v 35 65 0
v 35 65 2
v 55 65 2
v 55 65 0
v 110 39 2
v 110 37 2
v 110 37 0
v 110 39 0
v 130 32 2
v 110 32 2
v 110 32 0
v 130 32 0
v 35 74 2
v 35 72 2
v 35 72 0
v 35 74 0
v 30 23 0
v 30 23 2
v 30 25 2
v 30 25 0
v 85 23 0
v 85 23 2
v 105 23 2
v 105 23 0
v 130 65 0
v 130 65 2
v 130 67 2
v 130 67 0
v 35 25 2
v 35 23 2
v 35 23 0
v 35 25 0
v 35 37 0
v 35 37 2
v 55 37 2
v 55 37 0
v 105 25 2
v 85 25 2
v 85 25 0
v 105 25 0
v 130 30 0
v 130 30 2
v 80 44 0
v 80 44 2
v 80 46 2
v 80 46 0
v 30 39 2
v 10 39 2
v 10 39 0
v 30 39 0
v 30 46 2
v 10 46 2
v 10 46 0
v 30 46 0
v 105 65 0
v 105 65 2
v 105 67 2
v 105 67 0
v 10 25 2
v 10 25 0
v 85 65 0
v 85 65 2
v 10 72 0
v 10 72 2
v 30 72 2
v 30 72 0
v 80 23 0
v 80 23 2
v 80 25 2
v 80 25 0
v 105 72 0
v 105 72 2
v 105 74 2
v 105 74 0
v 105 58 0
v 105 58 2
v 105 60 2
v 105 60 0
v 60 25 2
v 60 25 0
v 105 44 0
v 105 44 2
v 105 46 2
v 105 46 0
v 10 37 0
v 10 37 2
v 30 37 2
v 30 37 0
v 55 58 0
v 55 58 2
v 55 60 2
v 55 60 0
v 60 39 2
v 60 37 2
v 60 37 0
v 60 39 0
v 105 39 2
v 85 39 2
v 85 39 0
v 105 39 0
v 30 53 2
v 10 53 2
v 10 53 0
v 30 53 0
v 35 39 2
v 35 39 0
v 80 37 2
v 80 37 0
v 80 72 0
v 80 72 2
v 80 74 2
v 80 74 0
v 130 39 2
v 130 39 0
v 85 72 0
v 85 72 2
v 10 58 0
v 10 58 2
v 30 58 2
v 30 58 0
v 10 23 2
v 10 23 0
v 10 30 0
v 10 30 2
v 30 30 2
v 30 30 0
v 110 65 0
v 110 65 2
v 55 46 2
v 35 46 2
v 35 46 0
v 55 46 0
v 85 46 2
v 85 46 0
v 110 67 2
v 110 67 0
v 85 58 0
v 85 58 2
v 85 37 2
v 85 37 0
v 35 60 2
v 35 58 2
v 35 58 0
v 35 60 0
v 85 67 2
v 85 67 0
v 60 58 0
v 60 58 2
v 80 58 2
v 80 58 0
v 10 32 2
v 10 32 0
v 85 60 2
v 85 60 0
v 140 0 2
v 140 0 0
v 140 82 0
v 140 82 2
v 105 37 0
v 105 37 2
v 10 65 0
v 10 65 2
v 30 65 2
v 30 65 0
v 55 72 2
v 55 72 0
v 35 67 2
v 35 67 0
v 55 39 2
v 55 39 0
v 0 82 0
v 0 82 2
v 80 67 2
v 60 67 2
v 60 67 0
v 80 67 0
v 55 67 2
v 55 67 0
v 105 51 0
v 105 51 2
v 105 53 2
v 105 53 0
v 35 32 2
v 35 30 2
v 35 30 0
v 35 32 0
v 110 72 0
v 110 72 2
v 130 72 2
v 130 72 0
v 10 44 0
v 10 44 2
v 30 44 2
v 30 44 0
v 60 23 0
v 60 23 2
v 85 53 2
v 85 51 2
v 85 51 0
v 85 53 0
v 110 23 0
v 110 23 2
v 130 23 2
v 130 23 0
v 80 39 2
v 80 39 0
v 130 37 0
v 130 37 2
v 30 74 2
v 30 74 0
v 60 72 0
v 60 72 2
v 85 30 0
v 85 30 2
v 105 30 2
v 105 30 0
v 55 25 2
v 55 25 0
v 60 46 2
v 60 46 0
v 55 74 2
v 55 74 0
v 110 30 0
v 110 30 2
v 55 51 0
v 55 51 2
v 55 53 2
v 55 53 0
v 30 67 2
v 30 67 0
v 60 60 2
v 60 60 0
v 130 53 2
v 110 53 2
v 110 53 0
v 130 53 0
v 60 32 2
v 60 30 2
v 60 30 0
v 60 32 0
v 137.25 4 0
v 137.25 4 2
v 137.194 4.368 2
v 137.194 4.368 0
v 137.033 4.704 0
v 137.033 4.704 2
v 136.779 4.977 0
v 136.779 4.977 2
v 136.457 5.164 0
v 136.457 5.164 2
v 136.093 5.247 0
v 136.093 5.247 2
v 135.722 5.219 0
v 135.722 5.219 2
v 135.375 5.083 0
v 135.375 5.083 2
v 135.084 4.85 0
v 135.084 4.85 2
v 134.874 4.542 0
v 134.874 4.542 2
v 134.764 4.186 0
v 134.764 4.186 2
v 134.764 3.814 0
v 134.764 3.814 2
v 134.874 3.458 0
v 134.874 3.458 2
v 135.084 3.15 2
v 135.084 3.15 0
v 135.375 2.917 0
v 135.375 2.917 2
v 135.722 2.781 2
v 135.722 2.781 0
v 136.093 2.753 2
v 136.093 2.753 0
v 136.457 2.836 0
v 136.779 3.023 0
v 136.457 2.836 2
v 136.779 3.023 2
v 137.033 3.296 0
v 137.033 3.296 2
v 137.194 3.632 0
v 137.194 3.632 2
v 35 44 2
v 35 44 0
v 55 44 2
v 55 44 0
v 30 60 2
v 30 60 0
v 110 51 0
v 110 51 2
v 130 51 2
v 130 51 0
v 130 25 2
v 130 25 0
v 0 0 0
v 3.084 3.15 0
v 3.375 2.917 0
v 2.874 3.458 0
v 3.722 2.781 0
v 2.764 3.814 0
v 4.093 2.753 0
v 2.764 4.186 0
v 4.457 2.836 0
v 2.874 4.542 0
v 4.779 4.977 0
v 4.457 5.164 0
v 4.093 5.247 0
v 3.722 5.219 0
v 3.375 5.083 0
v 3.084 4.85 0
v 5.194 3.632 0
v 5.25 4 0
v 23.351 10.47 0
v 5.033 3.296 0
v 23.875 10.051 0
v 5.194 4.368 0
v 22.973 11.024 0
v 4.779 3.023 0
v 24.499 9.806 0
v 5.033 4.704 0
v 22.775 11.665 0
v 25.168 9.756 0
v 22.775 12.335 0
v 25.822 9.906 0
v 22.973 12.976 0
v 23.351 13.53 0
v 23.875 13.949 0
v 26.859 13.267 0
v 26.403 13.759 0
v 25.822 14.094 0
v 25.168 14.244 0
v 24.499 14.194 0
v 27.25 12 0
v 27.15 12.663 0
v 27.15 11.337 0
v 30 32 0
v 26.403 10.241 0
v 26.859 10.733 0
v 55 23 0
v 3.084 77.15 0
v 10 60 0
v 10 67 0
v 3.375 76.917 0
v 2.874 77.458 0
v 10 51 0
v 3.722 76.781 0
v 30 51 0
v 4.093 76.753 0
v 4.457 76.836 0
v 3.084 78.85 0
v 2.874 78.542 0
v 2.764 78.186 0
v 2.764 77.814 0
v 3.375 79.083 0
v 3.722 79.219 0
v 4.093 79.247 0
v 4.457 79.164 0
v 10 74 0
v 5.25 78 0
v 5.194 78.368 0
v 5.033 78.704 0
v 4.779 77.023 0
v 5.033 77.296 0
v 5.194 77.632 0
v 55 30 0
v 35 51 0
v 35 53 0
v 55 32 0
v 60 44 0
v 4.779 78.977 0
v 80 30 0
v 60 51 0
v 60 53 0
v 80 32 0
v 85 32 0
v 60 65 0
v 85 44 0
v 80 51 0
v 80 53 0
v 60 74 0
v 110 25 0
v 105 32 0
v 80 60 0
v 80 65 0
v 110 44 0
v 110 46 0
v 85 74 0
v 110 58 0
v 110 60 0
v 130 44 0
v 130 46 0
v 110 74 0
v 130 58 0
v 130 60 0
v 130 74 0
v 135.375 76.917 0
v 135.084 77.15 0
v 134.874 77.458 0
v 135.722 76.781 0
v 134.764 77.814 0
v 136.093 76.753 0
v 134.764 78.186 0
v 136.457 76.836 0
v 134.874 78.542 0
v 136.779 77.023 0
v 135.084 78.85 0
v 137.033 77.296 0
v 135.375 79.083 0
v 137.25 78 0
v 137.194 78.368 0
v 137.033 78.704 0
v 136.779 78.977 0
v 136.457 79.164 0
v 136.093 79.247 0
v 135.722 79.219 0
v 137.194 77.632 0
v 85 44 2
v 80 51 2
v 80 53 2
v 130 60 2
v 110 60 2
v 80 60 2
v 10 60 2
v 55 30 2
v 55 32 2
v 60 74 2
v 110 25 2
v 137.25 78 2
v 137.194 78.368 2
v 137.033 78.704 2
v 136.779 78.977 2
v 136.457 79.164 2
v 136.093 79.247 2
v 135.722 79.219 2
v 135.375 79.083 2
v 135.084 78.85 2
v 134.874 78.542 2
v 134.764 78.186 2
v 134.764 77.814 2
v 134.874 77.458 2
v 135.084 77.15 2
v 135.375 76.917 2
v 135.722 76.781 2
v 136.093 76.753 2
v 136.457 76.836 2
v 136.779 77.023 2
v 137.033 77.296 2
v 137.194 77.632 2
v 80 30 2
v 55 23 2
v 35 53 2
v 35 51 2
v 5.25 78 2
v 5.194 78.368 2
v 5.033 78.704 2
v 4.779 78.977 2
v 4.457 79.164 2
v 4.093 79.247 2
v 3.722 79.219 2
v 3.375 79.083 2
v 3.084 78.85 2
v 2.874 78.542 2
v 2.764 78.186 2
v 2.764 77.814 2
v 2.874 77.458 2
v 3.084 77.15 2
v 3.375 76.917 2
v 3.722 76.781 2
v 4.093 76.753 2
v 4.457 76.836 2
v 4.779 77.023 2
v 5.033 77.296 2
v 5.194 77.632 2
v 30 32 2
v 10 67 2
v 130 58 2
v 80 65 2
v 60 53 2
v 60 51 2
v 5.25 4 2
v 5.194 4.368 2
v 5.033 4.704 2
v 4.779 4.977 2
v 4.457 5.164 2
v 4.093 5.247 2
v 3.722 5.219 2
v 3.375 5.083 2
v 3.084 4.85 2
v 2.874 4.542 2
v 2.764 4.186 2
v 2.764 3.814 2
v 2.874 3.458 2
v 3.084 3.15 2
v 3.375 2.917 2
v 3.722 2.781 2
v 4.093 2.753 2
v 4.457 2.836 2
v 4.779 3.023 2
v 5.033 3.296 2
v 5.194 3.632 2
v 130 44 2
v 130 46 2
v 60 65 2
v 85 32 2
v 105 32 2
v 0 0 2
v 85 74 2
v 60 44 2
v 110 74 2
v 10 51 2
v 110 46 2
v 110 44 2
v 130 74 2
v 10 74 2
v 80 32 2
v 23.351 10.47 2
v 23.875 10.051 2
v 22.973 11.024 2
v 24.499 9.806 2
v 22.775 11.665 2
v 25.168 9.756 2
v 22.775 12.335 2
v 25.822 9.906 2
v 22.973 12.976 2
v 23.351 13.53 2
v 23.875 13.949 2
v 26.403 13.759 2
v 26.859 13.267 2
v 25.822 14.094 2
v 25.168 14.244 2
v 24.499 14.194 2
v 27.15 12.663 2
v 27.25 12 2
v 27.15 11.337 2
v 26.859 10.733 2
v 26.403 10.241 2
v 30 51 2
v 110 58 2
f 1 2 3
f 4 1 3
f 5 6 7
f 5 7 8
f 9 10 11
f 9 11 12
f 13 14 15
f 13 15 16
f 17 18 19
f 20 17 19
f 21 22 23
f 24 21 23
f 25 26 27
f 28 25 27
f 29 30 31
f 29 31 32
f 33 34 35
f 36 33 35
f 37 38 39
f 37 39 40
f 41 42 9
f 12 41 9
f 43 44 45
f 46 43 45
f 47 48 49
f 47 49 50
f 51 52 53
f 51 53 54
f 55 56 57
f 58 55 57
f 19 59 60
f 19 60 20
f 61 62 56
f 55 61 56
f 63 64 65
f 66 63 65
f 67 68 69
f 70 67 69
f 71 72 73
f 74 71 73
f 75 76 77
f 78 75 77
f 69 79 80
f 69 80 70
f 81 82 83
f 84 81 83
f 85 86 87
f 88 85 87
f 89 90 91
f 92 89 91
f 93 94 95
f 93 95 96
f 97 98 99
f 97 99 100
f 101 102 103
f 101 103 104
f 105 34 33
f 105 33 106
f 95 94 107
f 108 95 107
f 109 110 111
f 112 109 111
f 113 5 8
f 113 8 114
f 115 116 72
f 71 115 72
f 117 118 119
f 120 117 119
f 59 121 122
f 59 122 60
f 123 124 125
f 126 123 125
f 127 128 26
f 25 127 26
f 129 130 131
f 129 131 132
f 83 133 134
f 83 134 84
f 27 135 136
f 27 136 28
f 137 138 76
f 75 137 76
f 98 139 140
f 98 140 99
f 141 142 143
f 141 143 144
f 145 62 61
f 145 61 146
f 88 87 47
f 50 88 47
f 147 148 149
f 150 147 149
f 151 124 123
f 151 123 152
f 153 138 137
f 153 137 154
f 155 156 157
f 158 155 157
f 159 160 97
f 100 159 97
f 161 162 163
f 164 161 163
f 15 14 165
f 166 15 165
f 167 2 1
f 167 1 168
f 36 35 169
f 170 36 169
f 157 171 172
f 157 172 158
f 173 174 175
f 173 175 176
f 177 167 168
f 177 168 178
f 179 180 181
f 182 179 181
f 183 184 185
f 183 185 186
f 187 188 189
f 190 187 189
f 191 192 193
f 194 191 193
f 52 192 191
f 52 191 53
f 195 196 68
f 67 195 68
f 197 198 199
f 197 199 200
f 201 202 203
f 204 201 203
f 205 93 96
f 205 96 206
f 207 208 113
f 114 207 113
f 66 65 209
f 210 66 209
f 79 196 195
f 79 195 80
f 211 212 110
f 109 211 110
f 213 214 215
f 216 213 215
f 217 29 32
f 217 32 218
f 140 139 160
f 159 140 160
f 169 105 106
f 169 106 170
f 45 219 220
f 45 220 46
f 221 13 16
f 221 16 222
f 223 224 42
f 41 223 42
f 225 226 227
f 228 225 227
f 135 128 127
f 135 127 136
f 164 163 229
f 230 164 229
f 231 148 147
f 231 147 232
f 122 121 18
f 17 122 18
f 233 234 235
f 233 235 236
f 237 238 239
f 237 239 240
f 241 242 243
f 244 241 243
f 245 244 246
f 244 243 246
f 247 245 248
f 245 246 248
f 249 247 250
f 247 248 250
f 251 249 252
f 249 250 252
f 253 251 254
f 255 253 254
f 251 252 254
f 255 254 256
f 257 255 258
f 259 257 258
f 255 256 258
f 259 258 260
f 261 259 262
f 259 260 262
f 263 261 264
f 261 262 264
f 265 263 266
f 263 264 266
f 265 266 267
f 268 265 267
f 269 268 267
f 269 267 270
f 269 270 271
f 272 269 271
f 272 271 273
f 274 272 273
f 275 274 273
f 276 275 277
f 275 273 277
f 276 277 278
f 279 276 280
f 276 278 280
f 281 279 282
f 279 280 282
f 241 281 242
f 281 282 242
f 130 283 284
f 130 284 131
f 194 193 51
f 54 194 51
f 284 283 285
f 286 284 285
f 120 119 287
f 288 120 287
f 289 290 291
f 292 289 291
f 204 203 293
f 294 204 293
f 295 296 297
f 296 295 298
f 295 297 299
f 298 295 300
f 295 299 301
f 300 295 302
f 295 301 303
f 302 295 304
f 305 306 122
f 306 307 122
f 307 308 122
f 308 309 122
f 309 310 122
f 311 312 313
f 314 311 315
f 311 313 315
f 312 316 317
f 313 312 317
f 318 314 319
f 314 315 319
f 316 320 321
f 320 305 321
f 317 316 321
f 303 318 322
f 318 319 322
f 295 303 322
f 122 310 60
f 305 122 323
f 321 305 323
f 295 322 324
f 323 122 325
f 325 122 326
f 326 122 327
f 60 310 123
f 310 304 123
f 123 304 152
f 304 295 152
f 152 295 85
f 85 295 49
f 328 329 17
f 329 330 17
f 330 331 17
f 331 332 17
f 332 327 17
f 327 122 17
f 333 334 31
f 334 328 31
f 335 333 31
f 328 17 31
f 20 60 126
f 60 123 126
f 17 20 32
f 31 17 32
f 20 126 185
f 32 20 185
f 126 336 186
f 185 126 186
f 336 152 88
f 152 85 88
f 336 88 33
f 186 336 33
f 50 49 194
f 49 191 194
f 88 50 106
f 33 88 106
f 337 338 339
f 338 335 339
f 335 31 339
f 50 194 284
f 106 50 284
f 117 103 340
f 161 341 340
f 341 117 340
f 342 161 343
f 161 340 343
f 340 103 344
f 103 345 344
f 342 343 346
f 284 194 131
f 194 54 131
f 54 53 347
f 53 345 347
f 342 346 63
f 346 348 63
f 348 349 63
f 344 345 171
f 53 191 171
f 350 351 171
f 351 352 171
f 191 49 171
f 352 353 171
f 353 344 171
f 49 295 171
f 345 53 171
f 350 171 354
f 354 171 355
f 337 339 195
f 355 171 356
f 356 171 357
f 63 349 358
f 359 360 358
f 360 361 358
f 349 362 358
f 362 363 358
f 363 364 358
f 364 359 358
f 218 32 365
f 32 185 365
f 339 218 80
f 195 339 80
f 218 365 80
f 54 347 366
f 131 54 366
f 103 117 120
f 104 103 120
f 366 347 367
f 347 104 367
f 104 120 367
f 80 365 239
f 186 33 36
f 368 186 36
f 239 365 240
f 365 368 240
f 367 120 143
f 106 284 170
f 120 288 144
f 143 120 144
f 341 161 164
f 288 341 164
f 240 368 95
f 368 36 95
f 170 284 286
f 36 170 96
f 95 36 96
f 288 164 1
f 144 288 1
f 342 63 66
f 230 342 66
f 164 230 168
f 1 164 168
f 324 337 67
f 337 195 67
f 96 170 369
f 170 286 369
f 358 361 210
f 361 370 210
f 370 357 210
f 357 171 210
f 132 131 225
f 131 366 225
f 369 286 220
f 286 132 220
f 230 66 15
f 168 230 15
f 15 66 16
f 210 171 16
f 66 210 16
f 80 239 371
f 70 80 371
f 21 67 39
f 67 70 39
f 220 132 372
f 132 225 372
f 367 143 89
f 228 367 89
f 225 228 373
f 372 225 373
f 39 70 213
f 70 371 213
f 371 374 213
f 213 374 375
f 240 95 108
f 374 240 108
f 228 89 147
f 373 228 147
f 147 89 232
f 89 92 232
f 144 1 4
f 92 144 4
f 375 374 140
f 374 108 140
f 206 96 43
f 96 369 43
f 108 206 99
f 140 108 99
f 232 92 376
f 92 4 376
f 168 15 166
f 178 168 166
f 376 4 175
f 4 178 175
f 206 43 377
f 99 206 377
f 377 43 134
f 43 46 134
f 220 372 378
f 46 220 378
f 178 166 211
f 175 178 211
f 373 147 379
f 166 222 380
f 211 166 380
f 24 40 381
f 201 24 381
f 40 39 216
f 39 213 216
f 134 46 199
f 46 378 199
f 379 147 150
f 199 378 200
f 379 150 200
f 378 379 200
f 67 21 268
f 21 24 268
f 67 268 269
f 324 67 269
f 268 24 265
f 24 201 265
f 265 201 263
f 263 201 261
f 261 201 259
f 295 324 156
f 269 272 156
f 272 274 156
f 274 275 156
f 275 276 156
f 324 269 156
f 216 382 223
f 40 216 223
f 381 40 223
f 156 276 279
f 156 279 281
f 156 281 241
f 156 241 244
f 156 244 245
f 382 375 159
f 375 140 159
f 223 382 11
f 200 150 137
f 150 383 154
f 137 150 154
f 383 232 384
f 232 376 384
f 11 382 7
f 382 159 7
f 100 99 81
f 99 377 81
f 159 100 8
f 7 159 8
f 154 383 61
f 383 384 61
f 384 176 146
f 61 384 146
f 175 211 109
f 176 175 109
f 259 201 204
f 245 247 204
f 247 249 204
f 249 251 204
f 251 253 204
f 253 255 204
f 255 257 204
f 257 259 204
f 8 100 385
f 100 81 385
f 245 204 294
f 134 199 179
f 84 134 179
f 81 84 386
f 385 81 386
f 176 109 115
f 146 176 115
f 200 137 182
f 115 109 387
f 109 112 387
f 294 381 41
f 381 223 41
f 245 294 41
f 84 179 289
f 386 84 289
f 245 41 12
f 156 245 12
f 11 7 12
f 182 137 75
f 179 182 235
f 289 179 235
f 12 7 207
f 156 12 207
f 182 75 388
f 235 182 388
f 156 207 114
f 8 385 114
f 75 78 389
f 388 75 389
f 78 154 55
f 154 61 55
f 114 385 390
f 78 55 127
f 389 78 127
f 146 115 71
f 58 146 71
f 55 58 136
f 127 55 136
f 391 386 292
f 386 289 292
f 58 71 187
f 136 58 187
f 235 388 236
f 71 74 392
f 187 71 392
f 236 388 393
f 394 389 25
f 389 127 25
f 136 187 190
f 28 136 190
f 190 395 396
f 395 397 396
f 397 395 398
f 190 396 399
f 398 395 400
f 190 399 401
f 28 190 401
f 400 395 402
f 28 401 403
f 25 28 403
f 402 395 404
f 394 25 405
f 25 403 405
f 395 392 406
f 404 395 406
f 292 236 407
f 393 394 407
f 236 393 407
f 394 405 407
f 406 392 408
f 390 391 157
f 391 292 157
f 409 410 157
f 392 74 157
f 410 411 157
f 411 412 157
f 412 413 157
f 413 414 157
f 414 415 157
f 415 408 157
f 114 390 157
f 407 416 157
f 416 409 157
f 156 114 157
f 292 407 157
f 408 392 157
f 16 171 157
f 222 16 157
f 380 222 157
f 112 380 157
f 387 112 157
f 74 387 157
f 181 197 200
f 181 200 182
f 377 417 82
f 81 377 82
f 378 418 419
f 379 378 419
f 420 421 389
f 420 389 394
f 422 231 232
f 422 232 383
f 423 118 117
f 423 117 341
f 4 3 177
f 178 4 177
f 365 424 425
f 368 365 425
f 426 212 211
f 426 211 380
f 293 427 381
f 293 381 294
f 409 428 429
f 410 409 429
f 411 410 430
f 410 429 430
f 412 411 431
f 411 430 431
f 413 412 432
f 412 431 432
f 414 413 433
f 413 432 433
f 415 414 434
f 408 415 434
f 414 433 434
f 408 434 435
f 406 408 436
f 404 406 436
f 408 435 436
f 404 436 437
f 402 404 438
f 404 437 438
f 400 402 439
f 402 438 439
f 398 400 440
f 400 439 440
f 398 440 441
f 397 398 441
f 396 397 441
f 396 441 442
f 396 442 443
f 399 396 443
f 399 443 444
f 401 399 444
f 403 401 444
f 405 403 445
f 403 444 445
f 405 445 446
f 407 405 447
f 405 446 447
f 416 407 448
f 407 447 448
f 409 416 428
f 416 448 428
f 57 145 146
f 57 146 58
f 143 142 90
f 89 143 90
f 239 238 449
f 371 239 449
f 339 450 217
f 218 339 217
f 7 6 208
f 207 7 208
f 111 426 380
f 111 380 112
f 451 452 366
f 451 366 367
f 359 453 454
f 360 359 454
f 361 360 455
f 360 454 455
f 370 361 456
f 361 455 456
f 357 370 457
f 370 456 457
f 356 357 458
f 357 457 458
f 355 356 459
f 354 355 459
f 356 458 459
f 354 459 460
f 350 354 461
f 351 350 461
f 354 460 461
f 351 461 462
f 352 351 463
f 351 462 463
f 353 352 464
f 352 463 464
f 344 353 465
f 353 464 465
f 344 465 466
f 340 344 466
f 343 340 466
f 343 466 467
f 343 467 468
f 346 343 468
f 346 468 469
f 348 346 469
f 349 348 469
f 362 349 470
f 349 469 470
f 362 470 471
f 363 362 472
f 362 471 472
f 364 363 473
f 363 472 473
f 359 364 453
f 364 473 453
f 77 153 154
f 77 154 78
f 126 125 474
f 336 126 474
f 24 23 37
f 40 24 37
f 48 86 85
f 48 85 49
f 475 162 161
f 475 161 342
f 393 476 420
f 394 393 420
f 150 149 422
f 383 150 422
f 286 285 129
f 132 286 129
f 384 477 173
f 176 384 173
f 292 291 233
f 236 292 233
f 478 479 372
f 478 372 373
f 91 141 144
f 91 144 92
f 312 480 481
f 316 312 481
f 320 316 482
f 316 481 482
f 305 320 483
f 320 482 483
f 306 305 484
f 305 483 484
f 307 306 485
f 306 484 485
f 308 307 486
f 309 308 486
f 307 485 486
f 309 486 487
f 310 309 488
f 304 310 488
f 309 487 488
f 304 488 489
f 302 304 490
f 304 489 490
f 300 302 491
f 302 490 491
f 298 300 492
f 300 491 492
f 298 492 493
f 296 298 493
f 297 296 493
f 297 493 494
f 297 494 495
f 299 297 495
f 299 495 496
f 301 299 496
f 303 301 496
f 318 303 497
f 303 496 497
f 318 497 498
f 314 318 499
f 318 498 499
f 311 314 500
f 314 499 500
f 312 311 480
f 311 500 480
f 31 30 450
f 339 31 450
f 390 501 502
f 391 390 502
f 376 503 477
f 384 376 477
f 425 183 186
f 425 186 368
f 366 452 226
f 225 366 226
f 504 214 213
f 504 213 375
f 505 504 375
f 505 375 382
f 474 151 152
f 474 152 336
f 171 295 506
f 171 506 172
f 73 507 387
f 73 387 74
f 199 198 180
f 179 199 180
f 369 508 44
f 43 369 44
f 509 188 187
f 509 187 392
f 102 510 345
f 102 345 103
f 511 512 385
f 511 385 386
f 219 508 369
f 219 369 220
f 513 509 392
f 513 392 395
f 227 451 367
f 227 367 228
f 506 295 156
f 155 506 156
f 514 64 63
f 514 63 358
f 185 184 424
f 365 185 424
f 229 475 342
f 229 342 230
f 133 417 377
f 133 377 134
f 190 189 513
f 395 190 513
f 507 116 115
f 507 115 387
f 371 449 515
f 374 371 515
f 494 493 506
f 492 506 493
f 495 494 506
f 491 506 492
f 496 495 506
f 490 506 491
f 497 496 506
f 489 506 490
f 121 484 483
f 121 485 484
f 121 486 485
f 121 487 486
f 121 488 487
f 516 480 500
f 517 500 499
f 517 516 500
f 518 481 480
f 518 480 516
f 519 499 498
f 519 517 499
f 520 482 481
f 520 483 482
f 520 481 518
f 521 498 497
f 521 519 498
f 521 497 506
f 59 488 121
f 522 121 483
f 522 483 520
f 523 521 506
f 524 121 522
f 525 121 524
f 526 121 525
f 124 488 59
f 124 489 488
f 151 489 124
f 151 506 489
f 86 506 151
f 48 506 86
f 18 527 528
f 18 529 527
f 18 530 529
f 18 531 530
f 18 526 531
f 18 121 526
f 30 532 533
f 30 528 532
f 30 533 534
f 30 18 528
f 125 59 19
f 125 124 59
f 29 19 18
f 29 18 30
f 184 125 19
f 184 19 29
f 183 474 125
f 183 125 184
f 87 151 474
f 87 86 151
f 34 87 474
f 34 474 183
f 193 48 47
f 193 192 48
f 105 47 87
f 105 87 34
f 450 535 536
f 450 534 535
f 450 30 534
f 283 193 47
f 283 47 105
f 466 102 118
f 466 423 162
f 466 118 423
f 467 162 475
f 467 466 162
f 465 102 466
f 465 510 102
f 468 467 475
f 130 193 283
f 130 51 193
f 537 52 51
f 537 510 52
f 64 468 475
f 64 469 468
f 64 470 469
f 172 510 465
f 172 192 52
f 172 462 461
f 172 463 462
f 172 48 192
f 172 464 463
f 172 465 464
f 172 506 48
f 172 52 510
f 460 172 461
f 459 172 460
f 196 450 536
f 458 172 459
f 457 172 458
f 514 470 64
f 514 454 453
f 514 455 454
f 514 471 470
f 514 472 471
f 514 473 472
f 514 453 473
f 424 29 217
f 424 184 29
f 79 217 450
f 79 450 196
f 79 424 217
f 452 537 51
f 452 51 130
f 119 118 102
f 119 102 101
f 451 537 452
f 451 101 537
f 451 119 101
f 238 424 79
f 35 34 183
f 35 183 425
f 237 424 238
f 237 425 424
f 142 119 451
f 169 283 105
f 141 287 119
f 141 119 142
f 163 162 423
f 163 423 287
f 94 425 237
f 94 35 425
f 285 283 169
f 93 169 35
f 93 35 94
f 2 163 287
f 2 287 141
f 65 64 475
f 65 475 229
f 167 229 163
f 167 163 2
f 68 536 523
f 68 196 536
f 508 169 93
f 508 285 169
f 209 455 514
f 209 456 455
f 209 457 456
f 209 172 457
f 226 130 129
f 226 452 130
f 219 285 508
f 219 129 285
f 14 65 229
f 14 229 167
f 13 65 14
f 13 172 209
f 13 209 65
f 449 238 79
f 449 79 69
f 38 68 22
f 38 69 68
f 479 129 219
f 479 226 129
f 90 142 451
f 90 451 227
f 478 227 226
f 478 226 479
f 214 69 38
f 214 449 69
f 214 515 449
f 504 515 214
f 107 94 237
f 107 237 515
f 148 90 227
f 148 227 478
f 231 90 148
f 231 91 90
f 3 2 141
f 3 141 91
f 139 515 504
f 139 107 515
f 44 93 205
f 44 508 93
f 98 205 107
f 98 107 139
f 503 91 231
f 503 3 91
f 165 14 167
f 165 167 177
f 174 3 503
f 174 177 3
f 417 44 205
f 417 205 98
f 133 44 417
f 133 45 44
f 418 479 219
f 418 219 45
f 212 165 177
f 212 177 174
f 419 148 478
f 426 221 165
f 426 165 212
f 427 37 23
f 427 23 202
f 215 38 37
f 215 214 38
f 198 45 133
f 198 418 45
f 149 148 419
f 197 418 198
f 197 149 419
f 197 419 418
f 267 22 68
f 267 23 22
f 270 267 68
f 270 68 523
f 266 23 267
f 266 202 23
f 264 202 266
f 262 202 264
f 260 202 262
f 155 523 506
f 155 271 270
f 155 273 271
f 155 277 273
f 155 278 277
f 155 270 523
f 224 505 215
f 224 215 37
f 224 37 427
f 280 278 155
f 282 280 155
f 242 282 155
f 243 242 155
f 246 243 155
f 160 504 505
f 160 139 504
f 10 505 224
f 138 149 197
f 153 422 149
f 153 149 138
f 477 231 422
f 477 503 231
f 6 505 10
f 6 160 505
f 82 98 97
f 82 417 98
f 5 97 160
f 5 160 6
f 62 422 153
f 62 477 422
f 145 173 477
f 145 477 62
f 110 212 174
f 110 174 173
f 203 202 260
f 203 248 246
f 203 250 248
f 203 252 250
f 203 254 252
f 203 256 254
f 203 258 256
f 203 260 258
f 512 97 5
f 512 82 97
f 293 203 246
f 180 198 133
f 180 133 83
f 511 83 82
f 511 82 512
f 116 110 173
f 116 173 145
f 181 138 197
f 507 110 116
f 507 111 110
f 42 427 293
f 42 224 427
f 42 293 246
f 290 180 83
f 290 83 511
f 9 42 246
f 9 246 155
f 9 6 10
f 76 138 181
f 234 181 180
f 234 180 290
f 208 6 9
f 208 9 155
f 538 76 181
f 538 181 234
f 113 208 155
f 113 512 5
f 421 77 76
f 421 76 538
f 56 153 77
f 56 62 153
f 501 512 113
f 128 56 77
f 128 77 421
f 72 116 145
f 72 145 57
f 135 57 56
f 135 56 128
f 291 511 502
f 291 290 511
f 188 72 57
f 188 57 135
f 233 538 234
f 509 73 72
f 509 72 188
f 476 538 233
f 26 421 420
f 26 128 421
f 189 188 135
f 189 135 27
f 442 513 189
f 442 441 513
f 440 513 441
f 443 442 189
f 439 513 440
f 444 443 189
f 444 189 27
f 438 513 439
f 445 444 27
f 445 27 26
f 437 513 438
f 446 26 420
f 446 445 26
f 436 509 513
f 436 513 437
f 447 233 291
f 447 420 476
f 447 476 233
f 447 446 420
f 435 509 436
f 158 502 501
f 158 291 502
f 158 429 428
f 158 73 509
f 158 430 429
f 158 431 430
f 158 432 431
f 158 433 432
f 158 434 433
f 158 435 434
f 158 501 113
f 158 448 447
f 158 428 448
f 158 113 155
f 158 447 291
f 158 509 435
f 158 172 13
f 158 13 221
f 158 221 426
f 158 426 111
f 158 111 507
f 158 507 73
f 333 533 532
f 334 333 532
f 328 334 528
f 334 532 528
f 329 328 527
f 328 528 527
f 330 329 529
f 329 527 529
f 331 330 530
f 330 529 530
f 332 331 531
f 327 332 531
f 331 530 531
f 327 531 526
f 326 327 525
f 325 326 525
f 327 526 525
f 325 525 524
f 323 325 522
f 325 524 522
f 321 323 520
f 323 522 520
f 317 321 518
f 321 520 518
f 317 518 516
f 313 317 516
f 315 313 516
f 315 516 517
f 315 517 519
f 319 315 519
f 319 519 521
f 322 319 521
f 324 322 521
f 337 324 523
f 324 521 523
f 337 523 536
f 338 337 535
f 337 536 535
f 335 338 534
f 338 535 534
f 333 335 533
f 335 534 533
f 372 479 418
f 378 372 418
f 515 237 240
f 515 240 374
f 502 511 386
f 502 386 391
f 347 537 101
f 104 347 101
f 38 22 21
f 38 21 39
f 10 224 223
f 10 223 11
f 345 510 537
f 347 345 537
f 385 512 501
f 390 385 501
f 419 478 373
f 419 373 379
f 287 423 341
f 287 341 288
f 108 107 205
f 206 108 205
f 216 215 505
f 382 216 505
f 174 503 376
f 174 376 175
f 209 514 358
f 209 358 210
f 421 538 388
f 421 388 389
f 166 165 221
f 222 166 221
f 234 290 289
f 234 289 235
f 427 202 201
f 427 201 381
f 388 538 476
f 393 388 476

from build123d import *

# Parameters (mm, degrees)
SKETCH_W      = 140
SKETCH_H      = 82
PAD_DEPTH     = 2
SKETCH001_R   = 1.25
SKETCH001_R_2 = 2.25
SKETCH001_W   = 20
SKETCH001_H   = 2
POCKET_DEPTH  = 2


with BuildPart() as part:
    # Sketch → Pad (new body)
    with BuildSketch(Plane.XY):
        with Locations((70, 41)):
            Rectangle(SKETCH_W, SKETCH_H)
    extrude(amount=PAD_DEPTH)

    # Sketch001 (on Face6 of Pad) → Pocket (cut)
    with BuildSketch(Plane.XY.offset(2)):
        with Locations((4, 78)):
            Circle(SKETCH001_R)
        with Locations((136, 78)):
            Circle(SKETCH001_R)
        with Locations((136, 4)):
            Circle(SKETCH001_R)
        with Locations((4, 4)):
            Circle(SKETCH001_R)
        with Locations((25, 12)):
            Circle(SKETCH001_R_2)
        with Locations((20, 73)):
            Rectangle(SKETCH001_W, SKETCH001_H)
        with Locations((45, 73)):
            Rectangle(SKETCH001_W, SKETCH001_H)
        with Locations((70, 73)):
            Rectangle(SKETCH001_W, SKETCH001_H)
        with Locations((95, 73)):
            Rectangle(SKETCH001_W, SKETCH001_H)
        with Locations((120, 73)):
            Rectangle(SKETCH001_W, SKETCH001_H)
        with Locations((20, 66)):
            Rectangle(SKETCH001_W, SKETCH001_H)
        with Locations((45, 66)):
            Rectangle(SKETCH001_W, SKETCH001_H)
        with Locations((70, 66)):
            Rectangle(SKETCH001_W, SKETCH001_H)
        with Locations((95, 66)):
            Rectangle(SKETCH001_W, SKETCH001_H)
        with Locations((120, 66)):
            Rectangle(SKETCH001_W, SKETCH001_H)
        with Locations((20, 59)):
            Rectangle(SKETCH001_W, SKETCH001_H)
        with Locations((45, 59)):
            Rectangle(SKETCH001_W, SKETCH001_H)
        with Locations((70, 59)):
            Rectangle(SKETCH001_W, SKETCH001_H)
        with Locations((95, 59)):
            Rectangle(SKETCH001_W, SKETCH001_H)
        with Locations((120, 59)):
            Rectangle(SKETCH001_W, SKETCH001_H)
        with Locations((20, 52)):
            Rectangle(SKETCH001_W, SKETCH001_H)
        with Locations((45, 52)):
            Rectangle(SKETCH001_W, SKETCH001_H)
        with Locations((70, 52)):
            Rectangle(SKETCH001_W, SKETCH001_H)
        with Locations((95, 52)):
            Rectangle(SKETCH001_W, SKETCH001_H)
        with Locations((120, 52)):
            Rectangle(SKETCH001_W, SKETCH001_H)
        with Locations((20, 45)):
            Rectangle(SKETCH001_W, SKETCH001_H)
        with Locations((45, 45)):
            Rectangle(SKETCH001_W, SKETCH001_H)
        with Locations((70, 45)):
            Rectangle(SKETCH001_W, SKETCH001_H)
        with Locations((95, 45)):
            Rectangle(SKETCH001_W, SKETCH001_H)
        with Locations((120, 45)):
            Rectangle(SKETCH001_W, SKETCH001_H)
        with Locations((20, 38)):
            Rectangle(SKETCH001_W, SKETCH001_H)
        with Locations((45, 38)):
            Rectangle(SKETCH001_W, SKETCH001_H)
        with Locations((70, 38)):
            Rectangle(SKETCH001_W, SKETCH001_H)
        with Locations((95, 38)):
            Rectangle(SKETCH001_W, SKETCH001_H)
        with Locations((120, 38)):
            Rectangle(SKETCH001_W, SKETCH001_H)
        with Locations((20, 31)):
            Rectangle(SKETCH001_W, SKETCH001_H)
        with Locations((45, 31)):
            Rectangle(SKETCH001_W, SKETCH001_H)
        with Locations((70, 31)):
            Rectangle(SKETCH001_W, SKETCH001_H)
        with Locations((95, 31)):
            Rectangle(SKETCH001_W, SKETCH001_H)
        with Locations((120, 31)):
            Rectangle(SKETCH001_W, SKETCH001_H)
        with Locations((20, 24)):
            Rectangle(SKETCH001_W, SKETCH001_H)
        with Locations((45, 24)):
            Rectangle(SKETCH001_W, SKETCH001_H)
        with Locations((70, 24)):
            Rectangle(SKETCH001_W, SKETCH001_H)
        with Locations((95, 24)):
            Rectangle(SKETCH001_W, SKETCH001_H)
        with Locations((120, 24)):
            Rectangle(SKETCH001_W, SKETCH001_H)
    extrude(amount=-POCKET_DEPTH, mode=Mode.SUBTRACT)


solid = part.part
